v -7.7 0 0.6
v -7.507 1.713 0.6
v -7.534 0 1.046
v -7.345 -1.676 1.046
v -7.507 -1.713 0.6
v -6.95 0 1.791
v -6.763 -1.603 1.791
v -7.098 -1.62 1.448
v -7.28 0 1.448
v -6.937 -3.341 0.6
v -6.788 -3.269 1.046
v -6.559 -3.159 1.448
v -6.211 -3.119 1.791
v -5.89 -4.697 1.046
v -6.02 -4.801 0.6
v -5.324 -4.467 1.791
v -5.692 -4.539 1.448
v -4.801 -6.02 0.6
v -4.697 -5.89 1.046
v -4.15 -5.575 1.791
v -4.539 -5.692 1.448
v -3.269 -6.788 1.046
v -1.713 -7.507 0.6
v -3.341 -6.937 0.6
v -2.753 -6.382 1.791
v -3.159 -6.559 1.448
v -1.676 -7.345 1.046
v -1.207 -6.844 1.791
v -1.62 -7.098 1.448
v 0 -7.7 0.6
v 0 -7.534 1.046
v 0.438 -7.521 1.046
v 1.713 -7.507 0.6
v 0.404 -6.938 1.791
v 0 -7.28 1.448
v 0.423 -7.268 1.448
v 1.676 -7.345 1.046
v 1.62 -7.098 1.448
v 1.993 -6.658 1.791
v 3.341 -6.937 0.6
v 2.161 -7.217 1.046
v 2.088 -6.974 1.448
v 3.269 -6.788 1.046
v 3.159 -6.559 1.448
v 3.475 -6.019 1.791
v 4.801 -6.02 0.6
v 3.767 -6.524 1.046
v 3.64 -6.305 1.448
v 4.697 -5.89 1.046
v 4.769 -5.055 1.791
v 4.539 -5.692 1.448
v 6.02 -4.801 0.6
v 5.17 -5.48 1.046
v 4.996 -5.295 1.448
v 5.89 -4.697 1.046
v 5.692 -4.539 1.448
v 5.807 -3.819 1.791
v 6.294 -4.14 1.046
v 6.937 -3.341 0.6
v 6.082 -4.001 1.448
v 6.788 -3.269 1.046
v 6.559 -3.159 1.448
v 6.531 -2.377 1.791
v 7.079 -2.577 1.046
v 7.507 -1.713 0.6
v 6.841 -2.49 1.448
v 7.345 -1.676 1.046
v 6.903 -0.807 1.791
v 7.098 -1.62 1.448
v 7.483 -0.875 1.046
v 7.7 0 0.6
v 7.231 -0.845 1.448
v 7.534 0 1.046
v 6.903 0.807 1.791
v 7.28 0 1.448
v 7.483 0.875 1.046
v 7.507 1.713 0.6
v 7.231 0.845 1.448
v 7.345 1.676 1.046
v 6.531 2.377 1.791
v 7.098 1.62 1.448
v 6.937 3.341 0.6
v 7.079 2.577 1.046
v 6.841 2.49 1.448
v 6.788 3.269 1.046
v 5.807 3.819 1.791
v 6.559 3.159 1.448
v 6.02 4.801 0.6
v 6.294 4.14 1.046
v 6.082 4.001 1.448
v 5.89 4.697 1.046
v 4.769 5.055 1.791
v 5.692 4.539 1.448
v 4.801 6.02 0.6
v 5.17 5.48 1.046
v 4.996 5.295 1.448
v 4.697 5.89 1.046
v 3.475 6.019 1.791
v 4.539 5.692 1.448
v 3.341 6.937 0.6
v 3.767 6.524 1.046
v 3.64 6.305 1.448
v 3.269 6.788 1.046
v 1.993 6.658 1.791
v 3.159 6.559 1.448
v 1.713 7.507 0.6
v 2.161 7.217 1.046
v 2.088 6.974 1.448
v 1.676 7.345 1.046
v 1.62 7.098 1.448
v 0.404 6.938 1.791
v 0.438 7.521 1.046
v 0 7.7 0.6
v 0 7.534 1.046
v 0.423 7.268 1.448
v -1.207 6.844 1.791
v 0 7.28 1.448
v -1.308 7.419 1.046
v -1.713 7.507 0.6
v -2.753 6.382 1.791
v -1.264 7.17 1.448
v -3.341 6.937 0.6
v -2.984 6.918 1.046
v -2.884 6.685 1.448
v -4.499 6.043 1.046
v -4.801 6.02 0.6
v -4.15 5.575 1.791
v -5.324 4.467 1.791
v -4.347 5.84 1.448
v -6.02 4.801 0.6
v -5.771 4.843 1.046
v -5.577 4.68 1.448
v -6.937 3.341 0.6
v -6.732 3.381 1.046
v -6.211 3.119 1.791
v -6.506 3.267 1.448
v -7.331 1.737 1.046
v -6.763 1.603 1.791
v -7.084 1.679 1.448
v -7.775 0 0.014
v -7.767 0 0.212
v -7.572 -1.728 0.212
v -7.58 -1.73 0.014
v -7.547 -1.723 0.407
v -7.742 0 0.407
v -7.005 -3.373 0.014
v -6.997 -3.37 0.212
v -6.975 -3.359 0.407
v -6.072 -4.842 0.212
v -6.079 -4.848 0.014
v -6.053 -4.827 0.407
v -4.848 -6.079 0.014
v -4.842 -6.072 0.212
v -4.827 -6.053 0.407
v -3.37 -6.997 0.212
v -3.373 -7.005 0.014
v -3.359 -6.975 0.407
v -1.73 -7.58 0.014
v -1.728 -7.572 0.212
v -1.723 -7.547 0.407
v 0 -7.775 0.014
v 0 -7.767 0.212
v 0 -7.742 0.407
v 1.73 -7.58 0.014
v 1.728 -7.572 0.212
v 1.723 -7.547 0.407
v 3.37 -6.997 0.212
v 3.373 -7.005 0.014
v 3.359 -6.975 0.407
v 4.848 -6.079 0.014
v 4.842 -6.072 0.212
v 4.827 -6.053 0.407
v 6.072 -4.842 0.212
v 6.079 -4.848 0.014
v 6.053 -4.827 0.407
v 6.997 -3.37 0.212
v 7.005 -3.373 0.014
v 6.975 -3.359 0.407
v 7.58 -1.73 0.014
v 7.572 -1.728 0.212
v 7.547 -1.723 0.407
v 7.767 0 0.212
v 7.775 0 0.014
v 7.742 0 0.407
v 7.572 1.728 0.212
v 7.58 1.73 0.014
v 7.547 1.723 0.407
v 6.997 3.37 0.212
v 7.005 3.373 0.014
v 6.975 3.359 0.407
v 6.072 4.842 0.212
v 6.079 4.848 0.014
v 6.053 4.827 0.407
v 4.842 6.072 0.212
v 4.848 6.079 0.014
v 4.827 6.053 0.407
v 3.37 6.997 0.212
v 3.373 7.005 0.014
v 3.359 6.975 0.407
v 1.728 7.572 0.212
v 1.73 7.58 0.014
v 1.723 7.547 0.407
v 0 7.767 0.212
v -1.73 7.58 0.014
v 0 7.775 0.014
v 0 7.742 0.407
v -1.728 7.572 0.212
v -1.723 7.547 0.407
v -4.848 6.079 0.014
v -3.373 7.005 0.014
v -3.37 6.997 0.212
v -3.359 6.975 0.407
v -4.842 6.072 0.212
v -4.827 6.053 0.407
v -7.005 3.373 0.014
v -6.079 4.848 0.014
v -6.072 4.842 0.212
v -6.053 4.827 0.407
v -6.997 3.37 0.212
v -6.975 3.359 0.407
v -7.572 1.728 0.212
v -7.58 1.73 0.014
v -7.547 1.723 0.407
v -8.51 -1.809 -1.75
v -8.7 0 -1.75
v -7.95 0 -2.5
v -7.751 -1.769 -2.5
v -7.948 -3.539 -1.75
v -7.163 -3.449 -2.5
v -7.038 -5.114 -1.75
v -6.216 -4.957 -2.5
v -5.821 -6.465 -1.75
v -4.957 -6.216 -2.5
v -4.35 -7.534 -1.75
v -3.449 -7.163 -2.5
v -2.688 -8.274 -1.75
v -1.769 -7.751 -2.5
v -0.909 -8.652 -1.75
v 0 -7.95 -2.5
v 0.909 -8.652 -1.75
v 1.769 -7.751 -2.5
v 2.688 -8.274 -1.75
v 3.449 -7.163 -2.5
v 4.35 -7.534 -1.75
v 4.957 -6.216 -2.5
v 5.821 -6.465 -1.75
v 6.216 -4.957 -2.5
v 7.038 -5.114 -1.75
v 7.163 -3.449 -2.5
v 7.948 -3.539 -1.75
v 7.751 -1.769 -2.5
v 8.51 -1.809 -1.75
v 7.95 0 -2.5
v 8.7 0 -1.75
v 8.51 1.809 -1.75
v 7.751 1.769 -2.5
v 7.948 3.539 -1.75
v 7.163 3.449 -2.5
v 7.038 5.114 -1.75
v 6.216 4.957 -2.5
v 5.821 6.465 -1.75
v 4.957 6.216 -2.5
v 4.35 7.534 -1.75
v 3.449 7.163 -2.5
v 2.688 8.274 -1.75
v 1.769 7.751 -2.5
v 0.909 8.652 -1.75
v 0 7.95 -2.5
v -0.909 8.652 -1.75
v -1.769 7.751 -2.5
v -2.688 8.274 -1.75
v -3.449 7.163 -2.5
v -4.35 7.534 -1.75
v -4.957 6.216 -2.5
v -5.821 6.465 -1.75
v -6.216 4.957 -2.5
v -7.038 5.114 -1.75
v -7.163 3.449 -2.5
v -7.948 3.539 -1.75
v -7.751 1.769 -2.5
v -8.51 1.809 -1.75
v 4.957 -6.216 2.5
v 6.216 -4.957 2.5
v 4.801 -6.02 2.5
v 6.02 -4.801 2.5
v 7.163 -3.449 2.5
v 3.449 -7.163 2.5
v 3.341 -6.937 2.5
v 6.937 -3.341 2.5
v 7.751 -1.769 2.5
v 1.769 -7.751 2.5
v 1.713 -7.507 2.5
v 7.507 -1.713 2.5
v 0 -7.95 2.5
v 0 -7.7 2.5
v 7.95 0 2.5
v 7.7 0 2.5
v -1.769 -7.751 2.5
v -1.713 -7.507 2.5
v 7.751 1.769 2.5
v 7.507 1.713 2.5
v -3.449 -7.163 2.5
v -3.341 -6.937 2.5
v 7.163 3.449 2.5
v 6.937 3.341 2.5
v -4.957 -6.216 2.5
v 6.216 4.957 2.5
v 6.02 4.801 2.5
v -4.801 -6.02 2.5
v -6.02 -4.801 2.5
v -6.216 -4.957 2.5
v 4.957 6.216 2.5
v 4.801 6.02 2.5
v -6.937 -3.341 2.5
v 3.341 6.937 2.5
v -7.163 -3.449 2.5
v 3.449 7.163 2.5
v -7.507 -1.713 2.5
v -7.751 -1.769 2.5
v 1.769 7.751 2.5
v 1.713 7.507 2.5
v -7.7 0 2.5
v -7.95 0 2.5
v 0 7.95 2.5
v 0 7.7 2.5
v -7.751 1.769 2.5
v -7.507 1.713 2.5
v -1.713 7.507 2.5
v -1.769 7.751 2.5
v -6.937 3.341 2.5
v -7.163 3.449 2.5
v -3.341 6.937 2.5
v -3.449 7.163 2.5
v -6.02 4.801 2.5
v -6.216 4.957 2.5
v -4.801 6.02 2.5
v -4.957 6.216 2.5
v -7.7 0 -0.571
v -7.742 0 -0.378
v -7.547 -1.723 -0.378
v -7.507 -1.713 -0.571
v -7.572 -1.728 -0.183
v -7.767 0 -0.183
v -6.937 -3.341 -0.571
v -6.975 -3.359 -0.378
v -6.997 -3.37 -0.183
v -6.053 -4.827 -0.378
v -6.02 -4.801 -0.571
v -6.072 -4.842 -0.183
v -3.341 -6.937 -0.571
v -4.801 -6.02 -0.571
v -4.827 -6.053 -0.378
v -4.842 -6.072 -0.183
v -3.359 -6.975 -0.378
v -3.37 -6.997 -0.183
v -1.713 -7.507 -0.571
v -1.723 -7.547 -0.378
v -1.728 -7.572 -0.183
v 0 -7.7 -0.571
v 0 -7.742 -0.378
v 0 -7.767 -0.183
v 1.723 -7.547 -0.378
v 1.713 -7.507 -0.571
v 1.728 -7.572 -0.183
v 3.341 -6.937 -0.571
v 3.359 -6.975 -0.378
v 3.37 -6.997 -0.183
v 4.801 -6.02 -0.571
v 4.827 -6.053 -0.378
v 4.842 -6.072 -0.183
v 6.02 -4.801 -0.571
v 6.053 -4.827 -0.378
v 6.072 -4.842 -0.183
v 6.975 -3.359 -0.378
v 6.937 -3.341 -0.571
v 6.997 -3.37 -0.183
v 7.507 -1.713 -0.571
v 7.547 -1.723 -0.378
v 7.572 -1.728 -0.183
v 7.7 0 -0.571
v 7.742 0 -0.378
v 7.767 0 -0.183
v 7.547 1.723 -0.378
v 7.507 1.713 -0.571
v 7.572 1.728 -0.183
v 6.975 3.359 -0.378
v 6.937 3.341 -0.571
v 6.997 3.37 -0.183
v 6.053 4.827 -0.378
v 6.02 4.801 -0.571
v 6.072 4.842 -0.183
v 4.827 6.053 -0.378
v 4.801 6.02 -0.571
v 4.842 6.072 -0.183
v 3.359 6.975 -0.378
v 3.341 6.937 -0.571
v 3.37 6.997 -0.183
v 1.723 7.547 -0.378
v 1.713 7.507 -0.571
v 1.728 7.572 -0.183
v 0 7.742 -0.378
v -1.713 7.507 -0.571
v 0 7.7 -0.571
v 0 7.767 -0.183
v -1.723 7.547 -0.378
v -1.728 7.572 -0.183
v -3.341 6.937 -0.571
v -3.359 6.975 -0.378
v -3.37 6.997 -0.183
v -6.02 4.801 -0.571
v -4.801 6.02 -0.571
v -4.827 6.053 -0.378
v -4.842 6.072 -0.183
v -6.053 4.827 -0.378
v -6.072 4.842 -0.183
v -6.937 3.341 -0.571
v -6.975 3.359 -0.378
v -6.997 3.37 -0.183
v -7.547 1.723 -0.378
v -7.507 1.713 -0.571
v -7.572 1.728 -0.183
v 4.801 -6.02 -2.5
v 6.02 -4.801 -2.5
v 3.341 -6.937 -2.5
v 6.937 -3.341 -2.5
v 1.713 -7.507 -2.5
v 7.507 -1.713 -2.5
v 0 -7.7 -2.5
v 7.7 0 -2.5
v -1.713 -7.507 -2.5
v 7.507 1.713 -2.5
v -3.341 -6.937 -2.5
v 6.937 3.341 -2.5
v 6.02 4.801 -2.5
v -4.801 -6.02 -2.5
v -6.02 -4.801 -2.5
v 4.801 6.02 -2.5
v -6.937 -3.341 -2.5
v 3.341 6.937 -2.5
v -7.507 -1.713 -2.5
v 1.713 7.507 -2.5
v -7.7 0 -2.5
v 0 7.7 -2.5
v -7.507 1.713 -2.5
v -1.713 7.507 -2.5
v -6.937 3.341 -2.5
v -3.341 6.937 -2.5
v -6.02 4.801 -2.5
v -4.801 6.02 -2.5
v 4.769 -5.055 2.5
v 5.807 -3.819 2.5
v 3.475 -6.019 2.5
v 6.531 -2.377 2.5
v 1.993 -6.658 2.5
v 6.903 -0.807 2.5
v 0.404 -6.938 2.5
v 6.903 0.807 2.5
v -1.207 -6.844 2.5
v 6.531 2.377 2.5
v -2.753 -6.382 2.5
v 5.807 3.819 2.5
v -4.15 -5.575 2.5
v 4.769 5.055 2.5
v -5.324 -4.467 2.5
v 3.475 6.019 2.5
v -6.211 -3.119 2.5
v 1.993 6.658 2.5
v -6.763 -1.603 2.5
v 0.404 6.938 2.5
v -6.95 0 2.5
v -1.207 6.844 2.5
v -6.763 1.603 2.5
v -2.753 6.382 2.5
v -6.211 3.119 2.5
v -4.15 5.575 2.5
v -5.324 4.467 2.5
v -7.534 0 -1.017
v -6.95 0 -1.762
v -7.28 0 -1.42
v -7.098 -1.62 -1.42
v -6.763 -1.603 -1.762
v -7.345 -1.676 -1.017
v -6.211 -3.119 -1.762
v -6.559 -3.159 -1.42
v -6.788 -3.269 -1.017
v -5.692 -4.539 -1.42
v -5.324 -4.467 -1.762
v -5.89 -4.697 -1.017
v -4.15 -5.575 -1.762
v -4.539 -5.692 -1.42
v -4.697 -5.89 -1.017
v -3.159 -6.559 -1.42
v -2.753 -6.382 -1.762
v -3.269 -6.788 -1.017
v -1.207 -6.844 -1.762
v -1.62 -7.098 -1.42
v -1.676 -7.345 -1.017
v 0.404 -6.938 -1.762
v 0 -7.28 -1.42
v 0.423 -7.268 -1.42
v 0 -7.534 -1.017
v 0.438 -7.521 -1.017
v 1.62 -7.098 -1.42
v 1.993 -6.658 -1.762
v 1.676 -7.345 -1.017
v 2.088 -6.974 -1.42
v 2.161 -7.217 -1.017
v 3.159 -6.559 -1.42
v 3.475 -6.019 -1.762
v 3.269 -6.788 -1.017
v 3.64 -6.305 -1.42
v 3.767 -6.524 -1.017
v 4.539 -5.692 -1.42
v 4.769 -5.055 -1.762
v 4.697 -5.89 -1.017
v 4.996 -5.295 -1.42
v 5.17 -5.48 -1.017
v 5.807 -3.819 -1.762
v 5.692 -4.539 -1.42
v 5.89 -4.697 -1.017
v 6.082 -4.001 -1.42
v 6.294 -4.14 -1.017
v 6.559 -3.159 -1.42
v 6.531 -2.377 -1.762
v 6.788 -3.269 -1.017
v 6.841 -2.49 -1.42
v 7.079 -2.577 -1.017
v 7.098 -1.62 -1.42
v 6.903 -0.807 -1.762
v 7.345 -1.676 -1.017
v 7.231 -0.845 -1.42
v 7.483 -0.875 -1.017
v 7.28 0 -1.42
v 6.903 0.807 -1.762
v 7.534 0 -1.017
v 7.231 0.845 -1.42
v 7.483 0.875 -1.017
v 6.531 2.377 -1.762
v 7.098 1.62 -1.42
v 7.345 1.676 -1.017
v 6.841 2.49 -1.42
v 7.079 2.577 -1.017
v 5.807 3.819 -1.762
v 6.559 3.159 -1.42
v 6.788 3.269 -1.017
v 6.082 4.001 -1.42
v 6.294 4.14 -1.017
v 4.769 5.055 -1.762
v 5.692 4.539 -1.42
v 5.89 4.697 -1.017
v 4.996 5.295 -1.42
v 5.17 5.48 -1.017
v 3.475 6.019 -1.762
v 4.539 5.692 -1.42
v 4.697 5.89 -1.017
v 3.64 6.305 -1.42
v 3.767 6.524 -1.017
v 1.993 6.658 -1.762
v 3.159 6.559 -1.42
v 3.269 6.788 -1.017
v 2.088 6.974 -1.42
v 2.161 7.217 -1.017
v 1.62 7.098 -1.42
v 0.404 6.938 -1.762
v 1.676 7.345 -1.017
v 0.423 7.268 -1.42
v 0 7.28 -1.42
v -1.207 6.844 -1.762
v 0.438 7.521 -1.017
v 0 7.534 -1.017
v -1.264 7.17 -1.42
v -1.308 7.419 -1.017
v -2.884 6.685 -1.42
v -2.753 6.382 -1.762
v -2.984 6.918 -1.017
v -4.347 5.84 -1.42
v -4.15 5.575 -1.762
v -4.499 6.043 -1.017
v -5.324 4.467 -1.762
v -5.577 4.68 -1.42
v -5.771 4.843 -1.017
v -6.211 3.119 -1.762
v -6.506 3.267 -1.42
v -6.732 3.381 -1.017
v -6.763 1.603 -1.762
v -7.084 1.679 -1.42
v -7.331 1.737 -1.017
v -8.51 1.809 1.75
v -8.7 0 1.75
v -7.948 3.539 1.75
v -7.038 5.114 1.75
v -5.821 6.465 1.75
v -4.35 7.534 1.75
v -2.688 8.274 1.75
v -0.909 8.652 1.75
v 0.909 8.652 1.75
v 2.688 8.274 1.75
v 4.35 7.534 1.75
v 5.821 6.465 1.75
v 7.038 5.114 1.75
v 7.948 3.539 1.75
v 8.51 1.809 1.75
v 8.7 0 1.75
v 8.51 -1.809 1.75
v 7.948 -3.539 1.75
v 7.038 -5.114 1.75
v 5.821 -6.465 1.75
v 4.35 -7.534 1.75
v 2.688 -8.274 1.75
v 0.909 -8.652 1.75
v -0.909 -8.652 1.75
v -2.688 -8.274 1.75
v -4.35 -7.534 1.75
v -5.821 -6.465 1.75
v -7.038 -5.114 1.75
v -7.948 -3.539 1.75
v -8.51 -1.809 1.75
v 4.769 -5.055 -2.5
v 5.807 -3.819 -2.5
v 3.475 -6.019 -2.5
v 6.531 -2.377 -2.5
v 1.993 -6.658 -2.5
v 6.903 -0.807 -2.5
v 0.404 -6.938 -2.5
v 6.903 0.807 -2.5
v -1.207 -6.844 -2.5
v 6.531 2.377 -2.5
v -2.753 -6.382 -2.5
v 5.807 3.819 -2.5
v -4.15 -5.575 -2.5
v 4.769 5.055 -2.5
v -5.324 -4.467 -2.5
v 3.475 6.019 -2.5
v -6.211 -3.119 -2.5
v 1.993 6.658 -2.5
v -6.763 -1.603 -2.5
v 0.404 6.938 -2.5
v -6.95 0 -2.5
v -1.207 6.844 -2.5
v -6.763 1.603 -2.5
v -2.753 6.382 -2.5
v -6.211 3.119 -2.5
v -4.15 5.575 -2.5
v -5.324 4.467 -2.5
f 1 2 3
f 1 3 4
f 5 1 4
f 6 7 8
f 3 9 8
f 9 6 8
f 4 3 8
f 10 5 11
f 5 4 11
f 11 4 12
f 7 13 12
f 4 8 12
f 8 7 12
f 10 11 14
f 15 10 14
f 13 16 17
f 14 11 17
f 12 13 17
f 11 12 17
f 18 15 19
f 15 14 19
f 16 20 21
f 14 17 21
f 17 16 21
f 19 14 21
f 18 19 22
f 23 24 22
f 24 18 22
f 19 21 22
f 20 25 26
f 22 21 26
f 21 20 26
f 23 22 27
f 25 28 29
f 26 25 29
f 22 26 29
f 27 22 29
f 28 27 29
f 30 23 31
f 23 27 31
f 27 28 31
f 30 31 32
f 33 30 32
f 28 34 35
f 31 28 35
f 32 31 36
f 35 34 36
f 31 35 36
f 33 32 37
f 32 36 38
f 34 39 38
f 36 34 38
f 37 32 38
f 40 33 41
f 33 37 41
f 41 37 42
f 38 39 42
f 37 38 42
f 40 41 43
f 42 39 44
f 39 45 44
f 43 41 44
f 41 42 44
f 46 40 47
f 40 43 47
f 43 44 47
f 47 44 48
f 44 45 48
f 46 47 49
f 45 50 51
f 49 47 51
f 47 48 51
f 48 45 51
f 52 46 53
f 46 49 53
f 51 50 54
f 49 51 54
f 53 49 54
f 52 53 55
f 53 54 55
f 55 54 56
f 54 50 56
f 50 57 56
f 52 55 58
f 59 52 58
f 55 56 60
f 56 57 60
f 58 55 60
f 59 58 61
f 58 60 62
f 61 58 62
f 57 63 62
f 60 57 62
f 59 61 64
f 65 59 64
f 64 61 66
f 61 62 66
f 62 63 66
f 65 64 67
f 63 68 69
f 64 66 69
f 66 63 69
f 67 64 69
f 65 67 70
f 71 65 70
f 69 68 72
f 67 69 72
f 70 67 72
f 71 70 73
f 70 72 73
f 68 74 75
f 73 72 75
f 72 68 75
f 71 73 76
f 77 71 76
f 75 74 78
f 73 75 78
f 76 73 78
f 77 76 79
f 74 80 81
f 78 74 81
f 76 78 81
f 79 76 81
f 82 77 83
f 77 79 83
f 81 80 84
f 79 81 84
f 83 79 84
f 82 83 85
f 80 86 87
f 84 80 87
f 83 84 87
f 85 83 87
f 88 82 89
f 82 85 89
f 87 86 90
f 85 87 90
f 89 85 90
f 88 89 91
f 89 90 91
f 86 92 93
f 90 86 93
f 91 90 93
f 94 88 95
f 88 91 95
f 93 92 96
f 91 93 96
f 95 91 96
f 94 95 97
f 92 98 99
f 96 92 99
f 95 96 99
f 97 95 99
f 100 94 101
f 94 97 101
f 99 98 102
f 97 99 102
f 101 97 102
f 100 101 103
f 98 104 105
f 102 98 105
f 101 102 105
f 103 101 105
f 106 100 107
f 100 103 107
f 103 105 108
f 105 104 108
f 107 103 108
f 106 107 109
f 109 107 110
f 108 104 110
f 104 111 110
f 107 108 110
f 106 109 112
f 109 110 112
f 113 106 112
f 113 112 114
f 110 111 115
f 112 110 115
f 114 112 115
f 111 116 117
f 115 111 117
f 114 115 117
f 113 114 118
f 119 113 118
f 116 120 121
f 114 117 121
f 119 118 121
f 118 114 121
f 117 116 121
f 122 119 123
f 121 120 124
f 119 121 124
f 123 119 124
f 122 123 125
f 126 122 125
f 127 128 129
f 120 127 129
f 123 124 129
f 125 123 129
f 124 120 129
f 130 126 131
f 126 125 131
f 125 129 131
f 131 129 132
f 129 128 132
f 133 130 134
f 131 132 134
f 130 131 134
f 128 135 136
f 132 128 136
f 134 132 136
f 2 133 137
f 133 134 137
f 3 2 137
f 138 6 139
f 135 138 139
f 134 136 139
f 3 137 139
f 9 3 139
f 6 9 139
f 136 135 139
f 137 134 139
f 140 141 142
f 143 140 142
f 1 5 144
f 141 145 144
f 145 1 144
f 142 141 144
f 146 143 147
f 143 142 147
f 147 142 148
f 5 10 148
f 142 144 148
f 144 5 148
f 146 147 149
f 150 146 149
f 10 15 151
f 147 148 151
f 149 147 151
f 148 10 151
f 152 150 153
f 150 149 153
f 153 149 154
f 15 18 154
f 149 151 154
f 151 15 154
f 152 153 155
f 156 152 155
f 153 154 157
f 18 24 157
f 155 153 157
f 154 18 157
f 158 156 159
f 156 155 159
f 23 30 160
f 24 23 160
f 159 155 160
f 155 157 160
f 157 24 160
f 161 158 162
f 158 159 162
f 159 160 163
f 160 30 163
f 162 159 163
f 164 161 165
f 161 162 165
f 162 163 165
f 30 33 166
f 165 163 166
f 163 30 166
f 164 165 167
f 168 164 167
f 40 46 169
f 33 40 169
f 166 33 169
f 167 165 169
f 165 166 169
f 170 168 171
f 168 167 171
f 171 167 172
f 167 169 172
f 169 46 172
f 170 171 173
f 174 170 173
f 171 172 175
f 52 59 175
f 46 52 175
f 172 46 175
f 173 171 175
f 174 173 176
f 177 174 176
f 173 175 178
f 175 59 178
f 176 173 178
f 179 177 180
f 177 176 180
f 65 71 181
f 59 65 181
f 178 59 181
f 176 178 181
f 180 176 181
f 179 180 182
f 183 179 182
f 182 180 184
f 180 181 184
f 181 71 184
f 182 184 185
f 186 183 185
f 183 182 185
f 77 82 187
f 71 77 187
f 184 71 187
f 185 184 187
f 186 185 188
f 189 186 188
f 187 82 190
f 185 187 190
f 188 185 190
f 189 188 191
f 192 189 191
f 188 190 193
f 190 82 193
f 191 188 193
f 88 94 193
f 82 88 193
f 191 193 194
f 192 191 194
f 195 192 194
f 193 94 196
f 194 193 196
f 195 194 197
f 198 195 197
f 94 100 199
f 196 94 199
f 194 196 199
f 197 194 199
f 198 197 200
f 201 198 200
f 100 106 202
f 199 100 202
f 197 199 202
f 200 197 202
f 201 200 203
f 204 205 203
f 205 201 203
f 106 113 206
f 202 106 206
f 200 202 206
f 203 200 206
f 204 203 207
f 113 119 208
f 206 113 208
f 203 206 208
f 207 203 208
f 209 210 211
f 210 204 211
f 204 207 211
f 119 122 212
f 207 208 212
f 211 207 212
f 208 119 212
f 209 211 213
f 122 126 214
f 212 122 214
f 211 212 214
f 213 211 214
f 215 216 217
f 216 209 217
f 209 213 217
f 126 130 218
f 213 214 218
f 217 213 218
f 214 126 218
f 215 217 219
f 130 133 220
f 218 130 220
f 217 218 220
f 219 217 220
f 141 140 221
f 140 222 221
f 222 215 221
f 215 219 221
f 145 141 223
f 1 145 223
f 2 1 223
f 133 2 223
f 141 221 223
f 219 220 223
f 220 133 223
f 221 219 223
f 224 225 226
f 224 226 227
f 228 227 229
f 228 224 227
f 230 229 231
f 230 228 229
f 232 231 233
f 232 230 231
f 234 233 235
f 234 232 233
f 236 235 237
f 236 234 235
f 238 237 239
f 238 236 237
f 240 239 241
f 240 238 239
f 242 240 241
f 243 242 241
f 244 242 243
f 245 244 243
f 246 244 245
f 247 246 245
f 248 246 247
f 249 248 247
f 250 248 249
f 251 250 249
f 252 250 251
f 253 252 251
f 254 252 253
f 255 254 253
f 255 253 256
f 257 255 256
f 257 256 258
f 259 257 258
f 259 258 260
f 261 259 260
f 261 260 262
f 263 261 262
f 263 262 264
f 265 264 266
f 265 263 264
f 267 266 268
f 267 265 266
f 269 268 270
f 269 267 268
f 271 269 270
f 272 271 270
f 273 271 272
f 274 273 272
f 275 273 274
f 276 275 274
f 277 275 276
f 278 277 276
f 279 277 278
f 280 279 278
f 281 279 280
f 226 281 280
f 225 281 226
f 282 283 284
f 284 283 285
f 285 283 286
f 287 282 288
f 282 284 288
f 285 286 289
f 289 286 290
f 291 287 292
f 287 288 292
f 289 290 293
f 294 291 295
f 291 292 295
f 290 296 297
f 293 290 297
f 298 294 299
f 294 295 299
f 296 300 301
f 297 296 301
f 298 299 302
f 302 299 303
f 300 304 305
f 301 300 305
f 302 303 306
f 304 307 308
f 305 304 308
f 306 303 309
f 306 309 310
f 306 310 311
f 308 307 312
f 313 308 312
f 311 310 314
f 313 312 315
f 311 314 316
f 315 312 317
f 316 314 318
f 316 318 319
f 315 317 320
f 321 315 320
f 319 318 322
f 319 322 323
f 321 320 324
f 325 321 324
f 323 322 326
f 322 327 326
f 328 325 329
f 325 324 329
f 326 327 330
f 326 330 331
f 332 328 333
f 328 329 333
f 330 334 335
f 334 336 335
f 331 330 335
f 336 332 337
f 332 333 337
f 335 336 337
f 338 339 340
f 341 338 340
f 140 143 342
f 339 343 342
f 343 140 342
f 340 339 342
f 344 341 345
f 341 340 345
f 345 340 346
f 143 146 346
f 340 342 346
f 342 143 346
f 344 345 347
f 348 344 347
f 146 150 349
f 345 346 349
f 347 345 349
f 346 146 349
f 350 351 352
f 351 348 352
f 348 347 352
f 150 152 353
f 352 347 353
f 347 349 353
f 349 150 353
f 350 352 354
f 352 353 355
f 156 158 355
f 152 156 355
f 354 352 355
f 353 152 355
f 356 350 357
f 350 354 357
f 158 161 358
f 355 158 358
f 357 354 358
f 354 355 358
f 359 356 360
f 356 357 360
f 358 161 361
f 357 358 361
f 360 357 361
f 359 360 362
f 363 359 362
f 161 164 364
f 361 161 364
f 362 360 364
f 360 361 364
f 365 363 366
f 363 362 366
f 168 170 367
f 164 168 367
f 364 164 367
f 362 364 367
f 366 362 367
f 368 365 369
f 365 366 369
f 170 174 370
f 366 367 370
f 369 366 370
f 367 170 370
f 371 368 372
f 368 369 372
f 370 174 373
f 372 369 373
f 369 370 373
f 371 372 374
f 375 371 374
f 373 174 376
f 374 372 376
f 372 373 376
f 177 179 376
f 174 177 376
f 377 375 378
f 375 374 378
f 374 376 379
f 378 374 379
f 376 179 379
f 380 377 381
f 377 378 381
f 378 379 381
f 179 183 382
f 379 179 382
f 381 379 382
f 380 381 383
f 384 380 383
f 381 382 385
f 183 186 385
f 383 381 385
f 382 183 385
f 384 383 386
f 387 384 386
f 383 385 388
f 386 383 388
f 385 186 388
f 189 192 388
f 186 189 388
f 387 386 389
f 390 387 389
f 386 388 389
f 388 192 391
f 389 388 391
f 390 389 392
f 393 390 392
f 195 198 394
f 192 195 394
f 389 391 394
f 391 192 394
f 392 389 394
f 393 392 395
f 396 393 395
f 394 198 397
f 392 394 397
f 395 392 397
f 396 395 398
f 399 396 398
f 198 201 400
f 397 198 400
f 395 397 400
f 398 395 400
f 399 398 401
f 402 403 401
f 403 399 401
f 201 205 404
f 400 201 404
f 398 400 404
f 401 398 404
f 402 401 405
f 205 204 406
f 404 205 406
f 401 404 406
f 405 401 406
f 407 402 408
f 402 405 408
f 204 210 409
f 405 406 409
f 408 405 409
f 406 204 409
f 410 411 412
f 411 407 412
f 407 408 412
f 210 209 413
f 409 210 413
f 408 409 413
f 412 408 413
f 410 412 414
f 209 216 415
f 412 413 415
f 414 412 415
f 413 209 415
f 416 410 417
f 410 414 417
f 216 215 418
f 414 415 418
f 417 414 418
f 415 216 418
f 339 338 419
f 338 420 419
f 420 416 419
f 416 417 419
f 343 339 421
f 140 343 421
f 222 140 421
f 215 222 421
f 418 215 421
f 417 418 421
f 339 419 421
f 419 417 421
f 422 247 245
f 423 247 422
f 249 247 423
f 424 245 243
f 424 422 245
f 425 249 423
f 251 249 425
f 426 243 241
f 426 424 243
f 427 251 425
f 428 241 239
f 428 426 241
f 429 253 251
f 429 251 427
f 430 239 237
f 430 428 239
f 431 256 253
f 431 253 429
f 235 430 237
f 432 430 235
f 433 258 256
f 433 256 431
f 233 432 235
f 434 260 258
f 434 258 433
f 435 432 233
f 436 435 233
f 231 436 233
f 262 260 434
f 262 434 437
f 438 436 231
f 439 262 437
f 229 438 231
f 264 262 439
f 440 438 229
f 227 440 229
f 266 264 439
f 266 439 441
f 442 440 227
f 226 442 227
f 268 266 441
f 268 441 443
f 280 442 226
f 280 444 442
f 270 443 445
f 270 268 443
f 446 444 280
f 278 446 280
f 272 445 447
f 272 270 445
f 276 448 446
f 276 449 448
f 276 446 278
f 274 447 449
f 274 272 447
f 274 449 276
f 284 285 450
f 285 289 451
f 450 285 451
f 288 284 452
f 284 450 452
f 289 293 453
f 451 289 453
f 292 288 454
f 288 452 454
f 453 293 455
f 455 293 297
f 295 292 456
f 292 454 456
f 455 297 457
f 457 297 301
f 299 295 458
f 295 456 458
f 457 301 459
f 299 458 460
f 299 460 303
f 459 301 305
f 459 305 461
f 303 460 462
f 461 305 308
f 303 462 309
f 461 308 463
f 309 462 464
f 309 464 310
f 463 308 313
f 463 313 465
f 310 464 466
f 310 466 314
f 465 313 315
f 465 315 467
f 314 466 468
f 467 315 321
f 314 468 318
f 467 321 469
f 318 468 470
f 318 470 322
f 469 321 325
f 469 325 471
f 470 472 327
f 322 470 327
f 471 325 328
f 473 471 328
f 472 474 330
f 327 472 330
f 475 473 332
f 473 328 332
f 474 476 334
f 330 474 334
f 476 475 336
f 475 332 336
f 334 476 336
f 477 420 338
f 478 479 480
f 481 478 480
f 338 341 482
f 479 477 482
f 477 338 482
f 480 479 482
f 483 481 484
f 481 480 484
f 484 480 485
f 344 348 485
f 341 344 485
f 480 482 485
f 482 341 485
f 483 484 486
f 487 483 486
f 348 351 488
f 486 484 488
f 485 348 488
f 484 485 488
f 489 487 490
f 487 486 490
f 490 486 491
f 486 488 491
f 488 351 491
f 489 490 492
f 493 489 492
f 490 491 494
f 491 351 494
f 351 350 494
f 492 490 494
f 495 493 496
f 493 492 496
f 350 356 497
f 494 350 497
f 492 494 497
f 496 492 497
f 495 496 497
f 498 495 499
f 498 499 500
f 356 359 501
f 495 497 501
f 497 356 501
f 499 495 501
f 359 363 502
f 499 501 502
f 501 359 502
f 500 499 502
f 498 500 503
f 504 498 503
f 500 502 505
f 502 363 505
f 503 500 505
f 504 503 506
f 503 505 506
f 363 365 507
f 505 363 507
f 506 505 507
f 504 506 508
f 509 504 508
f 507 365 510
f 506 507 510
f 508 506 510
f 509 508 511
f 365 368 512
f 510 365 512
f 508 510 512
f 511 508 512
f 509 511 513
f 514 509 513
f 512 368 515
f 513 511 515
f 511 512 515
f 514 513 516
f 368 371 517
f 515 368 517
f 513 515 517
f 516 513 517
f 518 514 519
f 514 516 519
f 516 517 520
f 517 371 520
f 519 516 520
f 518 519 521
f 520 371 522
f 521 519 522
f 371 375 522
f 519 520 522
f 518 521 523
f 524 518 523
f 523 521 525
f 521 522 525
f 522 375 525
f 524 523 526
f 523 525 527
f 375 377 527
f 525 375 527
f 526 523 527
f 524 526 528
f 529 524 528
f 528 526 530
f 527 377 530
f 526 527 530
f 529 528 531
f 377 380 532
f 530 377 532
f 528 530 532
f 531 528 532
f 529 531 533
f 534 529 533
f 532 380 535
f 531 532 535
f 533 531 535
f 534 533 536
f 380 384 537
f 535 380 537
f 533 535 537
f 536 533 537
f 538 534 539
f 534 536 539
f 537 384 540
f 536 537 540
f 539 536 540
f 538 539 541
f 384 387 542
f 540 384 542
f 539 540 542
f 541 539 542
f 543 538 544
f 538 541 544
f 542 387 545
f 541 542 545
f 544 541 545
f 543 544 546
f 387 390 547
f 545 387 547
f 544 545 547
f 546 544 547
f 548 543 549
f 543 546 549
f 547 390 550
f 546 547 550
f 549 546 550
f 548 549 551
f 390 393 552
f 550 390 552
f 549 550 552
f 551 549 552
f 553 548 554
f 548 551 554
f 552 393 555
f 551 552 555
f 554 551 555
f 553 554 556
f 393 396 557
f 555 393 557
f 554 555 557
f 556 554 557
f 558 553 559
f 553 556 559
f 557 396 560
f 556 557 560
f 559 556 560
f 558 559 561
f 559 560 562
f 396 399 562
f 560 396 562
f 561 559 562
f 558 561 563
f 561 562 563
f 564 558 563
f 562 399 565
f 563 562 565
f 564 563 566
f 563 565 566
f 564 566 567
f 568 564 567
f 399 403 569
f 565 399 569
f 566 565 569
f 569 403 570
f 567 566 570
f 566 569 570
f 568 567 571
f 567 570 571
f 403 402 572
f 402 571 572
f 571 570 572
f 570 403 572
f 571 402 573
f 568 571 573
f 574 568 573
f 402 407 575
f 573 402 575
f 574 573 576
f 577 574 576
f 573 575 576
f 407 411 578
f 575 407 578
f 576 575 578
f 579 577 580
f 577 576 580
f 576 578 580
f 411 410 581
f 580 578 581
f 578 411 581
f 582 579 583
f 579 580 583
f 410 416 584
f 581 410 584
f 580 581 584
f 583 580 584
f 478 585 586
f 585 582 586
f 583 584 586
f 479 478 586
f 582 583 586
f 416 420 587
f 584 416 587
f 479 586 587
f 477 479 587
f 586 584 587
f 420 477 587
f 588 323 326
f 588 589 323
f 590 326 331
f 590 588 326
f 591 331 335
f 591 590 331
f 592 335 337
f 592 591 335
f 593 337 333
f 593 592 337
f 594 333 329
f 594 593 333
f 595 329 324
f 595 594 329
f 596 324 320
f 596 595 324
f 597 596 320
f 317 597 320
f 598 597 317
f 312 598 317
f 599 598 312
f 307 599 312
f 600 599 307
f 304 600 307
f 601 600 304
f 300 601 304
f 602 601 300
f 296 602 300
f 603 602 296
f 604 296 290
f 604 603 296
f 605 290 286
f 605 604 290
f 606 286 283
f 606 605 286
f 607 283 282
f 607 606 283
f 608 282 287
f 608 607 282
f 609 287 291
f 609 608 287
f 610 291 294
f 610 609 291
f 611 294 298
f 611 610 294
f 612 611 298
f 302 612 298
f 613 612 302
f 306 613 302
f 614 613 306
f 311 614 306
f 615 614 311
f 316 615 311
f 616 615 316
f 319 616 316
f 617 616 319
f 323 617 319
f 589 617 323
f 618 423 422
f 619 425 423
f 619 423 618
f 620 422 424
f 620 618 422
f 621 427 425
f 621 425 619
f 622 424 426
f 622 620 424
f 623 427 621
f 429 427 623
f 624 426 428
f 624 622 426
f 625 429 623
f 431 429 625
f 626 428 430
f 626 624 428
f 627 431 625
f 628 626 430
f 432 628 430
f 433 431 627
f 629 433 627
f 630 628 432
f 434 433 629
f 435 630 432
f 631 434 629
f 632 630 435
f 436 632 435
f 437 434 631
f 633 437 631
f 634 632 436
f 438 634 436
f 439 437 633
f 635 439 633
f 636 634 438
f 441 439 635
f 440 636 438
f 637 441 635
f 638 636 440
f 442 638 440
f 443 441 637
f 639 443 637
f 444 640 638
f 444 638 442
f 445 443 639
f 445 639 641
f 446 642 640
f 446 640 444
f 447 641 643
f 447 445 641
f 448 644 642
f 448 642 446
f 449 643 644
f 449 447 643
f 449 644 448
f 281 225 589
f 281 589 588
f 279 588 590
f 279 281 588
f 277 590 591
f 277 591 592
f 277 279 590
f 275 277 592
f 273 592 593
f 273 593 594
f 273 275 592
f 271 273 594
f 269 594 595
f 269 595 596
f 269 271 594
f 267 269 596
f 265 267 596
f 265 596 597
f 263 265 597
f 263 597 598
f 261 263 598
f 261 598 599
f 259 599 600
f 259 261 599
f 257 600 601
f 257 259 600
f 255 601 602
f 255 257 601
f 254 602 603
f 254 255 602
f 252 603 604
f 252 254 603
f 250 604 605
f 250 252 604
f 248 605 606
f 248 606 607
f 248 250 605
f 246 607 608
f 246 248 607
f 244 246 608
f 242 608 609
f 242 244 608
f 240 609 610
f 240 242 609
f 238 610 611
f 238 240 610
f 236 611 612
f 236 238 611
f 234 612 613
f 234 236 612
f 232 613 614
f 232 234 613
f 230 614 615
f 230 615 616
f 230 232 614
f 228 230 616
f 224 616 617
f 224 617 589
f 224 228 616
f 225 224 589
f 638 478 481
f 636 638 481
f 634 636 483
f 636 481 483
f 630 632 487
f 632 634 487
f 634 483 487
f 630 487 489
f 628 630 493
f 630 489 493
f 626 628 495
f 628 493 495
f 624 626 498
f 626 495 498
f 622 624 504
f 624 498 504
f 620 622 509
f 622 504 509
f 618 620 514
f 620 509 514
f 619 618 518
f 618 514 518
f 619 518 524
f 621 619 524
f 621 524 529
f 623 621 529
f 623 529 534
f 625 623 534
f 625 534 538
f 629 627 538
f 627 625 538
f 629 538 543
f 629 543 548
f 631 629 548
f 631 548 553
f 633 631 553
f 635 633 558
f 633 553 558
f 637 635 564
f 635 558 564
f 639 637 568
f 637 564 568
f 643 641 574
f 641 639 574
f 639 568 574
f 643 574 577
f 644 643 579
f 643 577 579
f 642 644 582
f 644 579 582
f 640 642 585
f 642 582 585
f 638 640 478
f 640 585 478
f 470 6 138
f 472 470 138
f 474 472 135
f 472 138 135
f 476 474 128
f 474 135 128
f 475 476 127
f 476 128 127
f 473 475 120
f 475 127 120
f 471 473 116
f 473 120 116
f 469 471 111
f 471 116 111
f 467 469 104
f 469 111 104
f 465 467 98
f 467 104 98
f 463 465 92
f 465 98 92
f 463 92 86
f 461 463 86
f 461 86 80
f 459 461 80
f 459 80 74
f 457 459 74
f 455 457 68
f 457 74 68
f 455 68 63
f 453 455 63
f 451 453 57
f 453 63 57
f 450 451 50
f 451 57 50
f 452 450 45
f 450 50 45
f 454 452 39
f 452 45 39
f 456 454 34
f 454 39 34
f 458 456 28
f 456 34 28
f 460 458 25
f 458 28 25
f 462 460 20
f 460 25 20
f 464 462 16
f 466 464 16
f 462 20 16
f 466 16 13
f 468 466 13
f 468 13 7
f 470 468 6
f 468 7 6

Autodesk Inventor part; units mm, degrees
ref_plane "YZ Plane" through (0, 0, 0) normal (1, 0, 0) x (0, 1, 0)
ref_plane "XZ Plane" through (0, 0, 0) normal (0, 1, 0) x (-1, 0, 0)
ref_plane "XY Plane" through (0, 0, 0) normal (0, 0, 1) x (1, 0, 0)
sketch "Sketch1" plane through (0, 0, 0) normal (0, 1, 0) x (-1, 0, 0)
  line L0 (-3.2, 2.5) -> (3.2, 2.5)
  line L1 (3.2, -2.5) -> (-3.2, -2.5)
  line L2 (-3.2, -2.5) -> (-3.2, 2.5)
  line L3 (-3.2, 2.5) -> (3.2, -2.5) construction
  line L4 (3.2, 2.5) -> (-3.2, -2.5) construction
  circle A0 centre (5.45, 0.0144) radius 2.325
  line L5 (7.7, 2.5) -> (7.7, -2.5)
  line L6 (7.7, -2.5) -> (6.95, -2.5)
  line L7 (6.95, -2.5) -> (6.95, -1.762)
  line L8 (7.7, 2.5) -> (6.95, 2.5)
  line L9 (6.95, 2.5) -> (6.95, 1.7908)
  line L10 (7.7, 2.5) -> (8.7, 2.5)
  line L11 (8.7, 2.5) -> (8.7, -2.5)
  line L12 (8.7, -2.5) -> (7.7, -2.5)
  line L13 (7.7, -2.5) -> (7.7, 2.5)
  line L14 (0, 2.5) -> (0, -2.5)
  line L15 (3.2, -2.5) -> (3.2, 2.5)
  point P0 (0, 0)
  dimension "d1" = 6.4
  dimension "d2" = 5
  dimension "d3" = 4.65
  dimension "d4" = 2.25
  dimension "d5" = 0.75
  dimension "d6" = 1
  dimension "d11" = 2.25
revolve "Revolution1" add sketch "Sketch1" angle 360 about axis through (0, 0, 2.5) along (0, 0, -1) contours L9 L8 L5 A0 | L5 L10 L11 L12 A0 | A0 L5 L6 L7
chamfer "Chamfer1" distance 0.75 angle 45 2 edges at (8.7, 0, -2.5) (8.7, 0, 2.5)
properties part number "5mm Bearing Outside_3DPrint"
